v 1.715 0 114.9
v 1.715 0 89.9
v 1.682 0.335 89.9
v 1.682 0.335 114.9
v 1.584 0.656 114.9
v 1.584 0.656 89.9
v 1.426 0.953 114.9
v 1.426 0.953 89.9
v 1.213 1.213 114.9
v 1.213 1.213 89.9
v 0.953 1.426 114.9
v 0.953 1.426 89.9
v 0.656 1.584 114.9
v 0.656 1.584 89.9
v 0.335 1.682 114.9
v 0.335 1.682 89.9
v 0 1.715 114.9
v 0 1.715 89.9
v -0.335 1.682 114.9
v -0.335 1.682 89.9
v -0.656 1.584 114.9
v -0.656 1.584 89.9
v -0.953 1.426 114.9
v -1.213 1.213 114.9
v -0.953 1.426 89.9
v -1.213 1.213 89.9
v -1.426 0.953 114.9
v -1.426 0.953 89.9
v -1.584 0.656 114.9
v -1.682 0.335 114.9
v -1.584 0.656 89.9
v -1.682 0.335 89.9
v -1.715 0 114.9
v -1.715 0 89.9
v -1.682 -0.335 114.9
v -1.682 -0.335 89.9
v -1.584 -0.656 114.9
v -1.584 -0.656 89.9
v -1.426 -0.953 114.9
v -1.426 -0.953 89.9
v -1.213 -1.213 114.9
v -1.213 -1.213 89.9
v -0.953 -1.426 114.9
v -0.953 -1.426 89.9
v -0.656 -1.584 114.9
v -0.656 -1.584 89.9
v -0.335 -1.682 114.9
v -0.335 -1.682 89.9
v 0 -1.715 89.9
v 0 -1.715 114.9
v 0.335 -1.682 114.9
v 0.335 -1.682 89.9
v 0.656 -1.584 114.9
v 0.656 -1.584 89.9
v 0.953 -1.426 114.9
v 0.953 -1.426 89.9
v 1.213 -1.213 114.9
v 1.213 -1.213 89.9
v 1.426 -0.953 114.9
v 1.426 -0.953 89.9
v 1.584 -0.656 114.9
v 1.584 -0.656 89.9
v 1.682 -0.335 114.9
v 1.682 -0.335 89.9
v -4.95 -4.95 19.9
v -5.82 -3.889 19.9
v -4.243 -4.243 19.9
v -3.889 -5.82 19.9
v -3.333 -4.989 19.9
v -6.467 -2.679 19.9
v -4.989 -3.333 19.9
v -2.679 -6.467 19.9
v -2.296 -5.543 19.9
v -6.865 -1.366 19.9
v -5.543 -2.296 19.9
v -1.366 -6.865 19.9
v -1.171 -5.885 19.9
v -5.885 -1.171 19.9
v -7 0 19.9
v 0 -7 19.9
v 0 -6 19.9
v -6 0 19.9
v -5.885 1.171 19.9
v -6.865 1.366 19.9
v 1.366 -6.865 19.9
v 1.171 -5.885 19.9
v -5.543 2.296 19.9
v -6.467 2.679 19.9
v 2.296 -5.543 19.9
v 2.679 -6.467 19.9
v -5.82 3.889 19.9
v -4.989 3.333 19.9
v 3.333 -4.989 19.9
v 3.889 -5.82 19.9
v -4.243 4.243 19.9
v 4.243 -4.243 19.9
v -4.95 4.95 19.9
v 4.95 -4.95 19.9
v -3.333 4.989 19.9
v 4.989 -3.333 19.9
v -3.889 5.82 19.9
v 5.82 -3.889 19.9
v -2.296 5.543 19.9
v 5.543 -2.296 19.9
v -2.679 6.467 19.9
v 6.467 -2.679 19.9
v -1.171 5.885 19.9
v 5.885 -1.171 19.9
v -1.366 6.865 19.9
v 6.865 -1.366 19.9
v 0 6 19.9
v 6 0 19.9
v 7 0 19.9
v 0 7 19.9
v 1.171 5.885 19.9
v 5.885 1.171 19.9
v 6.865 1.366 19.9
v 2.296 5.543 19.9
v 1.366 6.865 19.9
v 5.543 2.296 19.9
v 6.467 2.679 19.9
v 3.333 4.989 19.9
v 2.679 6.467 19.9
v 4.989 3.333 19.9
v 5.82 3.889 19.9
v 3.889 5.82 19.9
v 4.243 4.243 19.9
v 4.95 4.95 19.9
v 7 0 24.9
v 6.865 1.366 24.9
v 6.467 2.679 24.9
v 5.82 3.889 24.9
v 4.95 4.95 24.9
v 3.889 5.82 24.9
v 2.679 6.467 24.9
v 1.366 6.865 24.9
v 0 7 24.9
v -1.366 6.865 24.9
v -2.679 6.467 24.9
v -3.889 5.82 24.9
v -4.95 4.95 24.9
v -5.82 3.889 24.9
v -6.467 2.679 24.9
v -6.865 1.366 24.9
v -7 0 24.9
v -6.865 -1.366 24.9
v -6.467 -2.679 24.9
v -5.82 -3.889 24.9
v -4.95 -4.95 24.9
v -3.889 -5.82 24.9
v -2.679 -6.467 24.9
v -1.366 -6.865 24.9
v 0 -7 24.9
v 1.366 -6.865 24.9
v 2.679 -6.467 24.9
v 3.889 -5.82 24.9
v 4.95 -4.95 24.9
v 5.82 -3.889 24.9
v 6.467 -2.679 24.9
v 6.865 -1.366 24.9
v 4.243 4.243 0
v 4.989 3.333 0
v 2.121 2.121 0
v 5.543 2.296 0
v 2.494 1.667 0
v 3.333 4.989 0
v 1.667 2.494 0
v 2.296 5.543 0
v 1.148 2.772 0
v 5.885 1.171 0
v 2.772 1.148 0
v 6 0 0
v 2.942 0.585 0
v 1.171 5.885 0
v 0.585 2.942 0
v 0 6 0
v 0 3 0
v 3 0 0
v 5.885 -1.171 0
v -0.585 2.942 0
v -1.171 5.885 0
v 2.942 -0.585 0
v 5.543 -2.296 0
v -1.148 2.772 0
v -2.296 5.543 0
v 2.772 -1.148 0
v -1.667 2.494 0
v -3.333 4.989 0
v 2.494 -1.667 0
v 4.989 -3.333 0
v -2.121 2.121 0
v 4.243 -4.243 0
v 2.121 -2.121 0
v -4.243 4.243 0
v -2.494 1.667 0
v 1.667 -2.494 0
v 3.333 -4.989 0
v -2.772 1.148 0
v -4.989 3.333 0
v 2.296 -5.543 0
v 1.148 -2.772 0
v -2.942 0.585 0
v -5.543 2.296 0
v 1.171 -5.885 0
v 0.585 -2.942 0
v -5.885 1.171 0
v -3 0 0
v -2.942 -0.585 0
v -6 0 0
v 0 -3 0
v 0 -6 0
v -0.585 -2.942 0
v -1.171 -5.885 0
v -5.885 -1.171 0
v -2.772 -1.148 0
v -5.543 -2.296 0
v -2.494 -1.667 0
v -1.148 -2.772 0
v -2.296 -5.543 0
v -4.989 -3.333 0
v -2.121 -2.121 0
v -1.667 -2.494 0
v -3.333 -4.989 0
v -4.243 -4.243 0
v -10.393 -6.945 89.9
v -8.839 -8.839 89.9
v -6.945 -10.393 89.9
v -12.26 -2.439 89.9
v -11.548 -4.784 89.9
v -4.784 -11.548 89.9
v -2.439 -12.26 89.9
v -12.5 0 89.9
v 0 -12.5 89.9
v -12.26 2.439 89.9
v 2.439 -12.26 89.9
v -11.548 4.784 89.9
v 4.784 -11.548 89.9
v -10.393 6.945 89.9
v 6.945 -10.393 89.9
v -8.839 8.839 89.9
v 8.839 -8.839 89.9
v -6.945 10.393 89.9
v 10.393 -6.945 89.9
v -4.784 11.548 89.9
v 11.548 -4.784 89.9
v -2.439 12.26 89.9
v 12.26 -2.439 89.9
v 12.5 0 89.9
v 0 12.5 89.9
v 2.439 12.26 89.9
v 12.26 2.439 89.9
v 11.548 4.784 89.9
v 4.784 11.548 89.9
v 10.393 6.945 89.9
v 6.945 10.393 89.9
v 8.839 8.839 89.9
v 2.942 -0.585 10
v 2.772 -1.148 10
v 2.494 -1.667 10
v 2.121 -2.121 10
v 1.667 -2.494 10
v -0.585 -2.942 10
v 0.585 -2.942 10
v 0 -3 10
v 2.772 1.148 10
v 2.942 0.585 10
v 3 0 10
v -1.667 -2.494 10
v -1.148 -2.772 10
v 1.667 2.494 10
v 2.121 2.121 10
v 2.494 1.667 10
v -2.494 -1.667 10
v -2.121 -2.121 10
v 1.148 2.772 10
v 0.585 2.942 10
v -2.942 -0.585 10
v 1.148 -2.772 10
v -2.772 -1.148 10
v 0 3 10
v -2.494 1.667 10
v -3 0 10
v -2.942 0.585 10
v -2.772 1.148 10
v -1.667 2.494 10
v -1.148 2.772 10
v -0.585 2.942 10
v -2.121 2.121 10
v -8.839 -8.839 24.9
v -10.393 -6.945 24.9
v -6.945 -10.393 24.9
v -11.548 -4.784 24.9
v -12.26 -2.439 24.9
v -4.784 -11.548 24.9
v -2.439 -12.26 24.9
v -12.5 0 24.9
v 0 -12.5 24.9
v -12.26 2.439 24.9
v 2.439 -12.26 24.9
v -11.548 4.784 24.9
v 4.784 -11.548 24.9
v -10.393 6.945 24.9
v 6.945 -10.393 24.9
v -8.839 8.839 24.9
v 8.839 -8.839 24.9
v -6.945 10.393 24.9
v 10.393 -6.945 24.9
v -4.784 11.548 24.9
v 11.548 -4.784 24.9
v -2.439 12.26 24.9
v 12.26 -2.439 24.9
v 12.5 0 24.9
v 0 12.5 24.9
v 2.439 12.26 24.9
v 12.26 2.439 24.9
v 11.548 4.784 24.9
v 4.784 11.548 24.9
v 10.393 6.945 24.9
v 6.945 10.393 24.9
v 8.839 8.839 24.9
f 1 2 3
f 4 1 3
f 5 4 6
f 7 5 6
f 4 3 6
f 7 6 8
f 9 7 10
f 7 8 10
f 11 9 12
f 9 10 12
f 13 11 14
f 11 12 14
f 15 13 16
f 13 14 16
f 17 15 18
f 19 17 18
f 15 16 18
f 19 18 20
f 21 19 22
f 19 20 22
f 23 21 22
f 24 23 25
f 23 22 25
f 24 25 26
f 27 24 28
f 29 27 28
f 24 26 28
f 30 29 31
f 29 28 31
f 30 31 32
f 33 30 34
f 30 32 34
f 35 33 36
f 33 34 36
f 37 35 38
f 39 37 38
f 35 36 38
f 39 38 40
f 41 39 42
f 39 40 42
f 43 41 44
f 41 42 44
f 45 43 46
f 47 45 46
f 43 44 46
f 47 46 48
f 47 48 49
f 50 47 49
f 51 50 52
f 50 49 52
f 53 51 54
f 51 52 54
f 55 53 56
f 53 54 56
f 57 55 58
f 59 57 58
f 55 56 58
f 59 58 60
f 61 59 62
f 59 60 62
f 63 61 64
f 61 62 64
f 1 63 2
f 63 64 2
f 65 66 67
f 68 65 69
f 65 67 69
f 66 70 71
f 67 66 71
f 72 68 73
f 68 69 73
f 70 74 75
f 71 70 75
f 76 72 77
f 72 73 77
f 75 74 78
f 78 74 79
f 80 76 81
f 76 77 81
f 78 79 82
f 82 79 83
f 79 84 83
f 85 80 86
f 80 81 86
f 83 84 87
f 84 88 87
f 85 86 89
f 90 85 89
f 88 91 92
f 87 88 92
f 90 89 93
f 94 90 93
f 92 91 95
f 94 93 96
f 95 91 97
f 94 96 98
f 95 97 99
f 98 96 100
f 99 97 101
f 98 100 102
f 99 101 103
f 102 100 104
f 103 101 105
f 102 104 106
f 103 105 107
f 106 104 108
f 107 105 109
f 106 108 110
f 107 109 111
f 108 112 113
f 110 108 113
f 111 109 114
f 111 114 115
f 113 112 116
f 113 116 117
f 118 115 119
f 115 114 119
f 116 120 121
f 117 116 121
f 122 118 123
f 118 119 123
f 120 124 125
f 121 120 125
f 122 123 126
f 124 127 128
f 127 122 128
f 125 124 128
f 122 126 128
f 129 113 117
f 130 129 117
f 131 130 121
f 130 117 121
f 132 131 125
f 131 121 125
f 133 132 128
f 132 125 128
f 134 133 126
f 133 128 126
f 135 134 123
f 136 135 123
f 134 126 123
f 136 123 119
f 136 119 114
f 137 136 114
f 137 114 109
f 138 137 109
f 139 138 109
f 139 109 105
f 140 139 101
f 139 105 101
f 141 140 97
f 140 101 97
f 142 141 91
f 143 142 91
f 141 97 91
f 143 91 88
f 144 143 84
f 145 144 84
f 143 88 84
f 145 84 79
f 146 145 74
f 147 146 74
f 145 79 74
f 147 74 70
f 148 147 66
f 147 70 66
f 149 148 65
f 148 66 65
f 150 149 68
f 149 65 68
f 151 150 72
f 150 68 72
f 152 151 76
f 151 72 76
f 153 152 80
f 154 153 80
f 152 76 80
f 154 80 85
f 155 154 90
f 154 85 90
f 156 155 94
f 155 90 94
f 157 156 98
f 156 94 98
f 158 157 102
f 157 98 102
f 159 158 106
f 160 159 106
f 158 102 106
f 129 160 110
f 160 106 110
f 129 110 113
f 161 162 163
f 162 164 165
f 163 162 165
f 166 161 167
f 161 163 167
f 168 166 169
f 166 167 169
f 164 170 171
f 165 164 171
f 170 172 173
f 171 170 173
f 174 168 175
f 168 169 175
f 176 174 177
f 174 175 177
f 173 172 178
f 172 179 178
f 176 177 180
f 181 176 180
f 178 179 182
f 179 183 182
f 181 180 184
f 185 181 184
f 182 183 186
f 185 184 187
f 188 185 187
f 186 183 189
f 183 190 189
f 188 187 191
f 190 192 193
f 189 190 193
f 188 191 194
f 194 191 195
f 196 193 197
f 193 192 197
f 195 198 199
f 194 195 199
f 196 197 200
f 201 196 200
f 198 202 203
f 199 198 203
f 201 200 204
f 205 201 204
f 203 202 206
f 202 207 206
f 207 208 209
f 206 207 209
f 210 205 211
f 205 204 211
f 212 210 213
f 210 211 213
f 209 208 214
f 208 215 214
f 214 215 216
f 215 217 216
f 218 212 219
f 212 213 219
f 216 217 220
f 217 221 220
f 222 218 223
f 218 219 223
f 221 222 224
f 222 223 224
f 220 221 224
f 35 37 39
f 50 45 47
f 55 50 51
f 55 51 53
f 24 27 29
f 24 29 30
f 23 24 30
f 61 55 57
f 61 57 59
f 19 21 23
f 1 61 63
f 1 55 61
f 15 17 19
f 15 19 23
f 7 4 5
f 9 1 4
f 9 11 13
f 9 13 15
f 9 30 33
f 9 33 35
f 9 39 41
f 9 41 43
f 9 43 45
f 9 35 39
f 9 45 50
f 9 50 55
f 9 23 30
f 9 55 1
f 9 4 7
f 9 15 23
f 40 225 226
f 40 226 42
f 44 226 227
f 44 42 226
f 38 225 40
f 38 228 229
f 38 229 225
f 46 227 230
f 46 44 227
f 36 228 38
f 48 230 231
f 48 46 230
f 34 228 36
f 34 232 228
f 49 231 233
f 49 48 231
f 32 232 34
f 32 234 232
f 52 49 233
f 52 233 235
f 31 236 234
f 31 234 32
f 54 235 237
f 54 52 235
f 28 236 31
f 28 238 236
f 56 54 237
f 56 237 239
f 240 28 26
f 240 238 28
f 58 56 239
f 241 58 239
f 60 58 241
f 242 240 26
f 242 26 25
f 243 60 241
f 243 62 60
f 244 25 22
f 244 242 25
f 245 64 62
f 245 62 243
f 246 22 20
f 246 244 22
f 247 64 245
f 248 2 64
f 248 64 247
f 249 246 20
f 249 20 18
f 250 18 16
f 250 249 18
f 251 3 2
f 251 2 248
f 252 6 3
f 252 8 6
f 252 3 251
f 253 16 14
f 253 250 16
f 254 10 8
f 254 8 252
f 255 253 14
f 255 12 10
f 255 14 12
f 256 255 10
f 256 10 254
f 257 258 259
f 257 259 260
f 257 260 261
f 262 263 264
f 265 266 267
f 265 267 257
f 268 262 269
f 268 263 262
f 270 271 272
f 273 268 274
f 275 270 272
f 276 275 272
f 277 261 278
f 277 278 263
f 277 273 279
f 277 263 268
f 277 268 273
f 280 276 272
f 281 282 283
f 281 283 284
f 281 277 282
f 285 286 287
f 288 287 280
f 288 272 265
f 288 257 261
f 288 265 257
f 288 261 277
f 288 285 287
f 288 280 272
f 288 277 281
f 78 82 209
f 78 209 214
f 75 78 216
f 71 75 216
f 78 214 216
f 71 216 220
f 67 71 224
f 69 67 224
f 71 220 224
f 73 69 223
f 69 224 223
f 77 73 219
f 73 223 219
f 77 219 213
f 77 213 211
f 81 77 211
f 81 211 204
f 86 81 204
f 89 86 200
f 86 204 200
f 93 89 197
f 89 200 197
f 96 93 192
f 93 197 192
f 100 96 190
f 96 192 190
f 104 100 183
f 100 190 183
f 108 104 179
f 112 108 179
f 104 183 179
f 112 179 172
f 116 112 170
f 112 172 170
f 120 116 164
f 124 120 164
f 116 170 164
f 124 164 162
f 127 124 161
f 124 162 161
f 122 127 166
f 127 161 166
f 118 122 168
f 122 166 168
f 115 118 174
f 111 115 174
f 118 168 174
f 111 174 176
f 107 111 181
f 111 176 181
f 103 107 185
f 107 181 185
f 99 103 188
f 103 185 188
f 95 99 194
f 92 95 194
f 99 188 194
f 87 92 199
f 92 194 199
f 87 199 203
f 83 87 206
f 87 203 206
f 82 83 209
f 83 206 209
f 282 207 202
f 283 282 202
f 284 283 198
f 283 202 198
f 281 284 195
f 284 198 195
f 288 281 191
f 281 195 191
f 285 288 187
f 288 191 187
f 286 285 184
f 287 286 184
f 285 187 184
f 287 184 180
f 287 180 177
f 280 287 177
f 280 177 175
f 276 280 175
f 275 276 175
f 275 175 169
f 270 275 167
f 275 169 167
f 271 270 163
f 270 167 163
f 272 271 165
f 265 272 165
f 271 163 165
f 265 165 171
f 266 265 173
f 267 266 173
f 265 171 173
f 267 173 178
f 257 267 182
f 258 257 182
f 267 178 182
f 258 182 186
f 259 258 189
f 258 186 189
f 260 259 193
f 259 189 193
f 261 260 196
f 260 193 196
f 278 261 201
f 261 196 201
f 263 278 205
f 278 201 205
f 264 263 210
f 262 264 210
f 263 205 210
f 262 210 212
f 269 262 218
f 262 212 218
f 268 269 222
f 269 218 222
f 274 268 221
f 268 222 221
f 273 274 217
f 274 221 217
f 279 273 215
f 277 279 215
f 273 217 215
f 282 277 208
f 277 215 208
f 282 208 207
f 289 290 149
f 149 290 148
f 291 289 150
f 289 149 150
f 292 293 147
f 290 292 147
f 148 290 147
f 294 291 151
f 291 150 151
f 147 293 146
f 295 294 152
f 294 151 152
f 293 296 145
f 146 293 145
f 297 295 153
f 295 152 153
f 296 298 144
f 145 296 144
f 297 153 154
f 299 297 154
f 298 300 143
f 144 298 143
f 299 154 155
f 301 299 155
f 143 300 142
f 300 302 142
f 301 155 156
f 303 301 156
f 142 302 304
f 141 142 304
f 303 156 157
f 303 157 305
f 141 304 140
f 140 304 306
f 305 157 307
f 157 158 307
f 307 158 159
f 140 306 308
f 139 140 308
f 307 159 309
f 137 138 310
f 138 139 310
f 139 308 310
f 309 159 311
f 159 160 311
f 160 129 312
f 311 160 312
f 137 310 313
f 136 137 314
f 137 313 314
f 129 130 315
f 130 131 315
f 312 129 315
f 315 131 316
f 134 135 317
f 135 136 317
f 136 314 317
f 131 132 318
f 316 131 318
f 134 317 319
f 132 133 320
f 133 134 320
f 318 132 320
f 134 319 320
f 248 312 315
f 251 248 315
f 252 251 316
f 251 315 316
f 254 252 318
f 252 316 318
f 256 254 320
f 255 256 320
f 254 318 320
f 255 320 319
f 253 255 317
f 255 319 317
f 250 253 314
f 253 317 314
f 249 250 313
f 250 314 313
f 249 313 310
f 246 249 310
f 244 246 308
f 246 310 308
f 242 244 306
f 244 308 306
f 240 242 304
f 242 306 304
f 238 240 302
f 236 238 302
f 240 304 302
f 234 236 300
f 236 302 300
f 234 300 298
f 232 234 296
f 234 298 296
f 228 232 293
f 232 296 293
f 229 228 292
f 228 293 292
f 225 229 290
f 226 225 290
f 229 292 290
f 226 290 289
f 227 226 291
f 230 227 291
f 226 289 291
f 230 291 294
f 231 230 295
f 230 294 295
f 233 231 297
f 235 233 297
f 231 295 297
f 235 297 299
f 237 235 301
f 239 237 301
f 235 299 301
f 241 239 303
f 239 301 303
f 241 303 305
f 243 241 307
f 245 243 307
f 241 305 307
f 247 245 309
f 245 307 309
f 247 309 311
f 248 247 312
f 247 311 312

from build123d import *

# Parameters (mm, degrees)
SKETCH1_R                  = 6
BEARING_JOURNAL_12MM_DEPTH = 19.9
SKETCH2_R                  = 7
BOSS_EXTRUDE2_DEPTH        = 5
SKETCH3_R                  = 12.5
BODY_M25_DEPTH             = 65
SKETCH4_R                  = 1.714870996
CABLE_DEPTH                = 25
SKETCH5_R                  = 3
CUT_EXTRUDE_M6_DEPTH       = 10


with BuildPart() as part:
    # Sketch1 → Bearing Journal-12mm (new body)
    with BuildSketch(Plane.XY):
        with Locations(Location((0, 0, 0), (0, 0, 180))):
            Circle(SKETCH1_R)
    extrude(amount=BEARING_JOURNAL_12MM_DEPTH)

    # Sketch2 → Boss-Extrude2 (add)
    with BuildSketch(Plane.XY.offset(19.9)):
        Circle(SKETCH2_R)
    extrude(amount=BOSS_EXTRUDE2_DEPTH)

    # Sketch3 → Body-M25 (add)
    with BuildSketch(Plane.XY.offset(24.9)):
        Circle(SKETCH3_R)
    extrude(amount=BODY_M25_DEPTH)

    # Sketch4 → Cable (add)
    with BuildSketch(Plane.XY.offset(89.9)):
        Circle(SKETCH4_R)
    extrude(amount=CABLE_DEPTH)

    # Sketch5 → Cut-Extrude M6 (cut)
    with BuildSketch(Plane(origin=(0, 0, 0), x_dir=(-1, 0, 0), z_dir=(0, 0, -1))):
        Circle(SKETCH5_R)
    extrude(amount=-CUT_EXTRUDE_M6_DEPTH, mode=Mode.SUBTRACT)


solid = part.part
